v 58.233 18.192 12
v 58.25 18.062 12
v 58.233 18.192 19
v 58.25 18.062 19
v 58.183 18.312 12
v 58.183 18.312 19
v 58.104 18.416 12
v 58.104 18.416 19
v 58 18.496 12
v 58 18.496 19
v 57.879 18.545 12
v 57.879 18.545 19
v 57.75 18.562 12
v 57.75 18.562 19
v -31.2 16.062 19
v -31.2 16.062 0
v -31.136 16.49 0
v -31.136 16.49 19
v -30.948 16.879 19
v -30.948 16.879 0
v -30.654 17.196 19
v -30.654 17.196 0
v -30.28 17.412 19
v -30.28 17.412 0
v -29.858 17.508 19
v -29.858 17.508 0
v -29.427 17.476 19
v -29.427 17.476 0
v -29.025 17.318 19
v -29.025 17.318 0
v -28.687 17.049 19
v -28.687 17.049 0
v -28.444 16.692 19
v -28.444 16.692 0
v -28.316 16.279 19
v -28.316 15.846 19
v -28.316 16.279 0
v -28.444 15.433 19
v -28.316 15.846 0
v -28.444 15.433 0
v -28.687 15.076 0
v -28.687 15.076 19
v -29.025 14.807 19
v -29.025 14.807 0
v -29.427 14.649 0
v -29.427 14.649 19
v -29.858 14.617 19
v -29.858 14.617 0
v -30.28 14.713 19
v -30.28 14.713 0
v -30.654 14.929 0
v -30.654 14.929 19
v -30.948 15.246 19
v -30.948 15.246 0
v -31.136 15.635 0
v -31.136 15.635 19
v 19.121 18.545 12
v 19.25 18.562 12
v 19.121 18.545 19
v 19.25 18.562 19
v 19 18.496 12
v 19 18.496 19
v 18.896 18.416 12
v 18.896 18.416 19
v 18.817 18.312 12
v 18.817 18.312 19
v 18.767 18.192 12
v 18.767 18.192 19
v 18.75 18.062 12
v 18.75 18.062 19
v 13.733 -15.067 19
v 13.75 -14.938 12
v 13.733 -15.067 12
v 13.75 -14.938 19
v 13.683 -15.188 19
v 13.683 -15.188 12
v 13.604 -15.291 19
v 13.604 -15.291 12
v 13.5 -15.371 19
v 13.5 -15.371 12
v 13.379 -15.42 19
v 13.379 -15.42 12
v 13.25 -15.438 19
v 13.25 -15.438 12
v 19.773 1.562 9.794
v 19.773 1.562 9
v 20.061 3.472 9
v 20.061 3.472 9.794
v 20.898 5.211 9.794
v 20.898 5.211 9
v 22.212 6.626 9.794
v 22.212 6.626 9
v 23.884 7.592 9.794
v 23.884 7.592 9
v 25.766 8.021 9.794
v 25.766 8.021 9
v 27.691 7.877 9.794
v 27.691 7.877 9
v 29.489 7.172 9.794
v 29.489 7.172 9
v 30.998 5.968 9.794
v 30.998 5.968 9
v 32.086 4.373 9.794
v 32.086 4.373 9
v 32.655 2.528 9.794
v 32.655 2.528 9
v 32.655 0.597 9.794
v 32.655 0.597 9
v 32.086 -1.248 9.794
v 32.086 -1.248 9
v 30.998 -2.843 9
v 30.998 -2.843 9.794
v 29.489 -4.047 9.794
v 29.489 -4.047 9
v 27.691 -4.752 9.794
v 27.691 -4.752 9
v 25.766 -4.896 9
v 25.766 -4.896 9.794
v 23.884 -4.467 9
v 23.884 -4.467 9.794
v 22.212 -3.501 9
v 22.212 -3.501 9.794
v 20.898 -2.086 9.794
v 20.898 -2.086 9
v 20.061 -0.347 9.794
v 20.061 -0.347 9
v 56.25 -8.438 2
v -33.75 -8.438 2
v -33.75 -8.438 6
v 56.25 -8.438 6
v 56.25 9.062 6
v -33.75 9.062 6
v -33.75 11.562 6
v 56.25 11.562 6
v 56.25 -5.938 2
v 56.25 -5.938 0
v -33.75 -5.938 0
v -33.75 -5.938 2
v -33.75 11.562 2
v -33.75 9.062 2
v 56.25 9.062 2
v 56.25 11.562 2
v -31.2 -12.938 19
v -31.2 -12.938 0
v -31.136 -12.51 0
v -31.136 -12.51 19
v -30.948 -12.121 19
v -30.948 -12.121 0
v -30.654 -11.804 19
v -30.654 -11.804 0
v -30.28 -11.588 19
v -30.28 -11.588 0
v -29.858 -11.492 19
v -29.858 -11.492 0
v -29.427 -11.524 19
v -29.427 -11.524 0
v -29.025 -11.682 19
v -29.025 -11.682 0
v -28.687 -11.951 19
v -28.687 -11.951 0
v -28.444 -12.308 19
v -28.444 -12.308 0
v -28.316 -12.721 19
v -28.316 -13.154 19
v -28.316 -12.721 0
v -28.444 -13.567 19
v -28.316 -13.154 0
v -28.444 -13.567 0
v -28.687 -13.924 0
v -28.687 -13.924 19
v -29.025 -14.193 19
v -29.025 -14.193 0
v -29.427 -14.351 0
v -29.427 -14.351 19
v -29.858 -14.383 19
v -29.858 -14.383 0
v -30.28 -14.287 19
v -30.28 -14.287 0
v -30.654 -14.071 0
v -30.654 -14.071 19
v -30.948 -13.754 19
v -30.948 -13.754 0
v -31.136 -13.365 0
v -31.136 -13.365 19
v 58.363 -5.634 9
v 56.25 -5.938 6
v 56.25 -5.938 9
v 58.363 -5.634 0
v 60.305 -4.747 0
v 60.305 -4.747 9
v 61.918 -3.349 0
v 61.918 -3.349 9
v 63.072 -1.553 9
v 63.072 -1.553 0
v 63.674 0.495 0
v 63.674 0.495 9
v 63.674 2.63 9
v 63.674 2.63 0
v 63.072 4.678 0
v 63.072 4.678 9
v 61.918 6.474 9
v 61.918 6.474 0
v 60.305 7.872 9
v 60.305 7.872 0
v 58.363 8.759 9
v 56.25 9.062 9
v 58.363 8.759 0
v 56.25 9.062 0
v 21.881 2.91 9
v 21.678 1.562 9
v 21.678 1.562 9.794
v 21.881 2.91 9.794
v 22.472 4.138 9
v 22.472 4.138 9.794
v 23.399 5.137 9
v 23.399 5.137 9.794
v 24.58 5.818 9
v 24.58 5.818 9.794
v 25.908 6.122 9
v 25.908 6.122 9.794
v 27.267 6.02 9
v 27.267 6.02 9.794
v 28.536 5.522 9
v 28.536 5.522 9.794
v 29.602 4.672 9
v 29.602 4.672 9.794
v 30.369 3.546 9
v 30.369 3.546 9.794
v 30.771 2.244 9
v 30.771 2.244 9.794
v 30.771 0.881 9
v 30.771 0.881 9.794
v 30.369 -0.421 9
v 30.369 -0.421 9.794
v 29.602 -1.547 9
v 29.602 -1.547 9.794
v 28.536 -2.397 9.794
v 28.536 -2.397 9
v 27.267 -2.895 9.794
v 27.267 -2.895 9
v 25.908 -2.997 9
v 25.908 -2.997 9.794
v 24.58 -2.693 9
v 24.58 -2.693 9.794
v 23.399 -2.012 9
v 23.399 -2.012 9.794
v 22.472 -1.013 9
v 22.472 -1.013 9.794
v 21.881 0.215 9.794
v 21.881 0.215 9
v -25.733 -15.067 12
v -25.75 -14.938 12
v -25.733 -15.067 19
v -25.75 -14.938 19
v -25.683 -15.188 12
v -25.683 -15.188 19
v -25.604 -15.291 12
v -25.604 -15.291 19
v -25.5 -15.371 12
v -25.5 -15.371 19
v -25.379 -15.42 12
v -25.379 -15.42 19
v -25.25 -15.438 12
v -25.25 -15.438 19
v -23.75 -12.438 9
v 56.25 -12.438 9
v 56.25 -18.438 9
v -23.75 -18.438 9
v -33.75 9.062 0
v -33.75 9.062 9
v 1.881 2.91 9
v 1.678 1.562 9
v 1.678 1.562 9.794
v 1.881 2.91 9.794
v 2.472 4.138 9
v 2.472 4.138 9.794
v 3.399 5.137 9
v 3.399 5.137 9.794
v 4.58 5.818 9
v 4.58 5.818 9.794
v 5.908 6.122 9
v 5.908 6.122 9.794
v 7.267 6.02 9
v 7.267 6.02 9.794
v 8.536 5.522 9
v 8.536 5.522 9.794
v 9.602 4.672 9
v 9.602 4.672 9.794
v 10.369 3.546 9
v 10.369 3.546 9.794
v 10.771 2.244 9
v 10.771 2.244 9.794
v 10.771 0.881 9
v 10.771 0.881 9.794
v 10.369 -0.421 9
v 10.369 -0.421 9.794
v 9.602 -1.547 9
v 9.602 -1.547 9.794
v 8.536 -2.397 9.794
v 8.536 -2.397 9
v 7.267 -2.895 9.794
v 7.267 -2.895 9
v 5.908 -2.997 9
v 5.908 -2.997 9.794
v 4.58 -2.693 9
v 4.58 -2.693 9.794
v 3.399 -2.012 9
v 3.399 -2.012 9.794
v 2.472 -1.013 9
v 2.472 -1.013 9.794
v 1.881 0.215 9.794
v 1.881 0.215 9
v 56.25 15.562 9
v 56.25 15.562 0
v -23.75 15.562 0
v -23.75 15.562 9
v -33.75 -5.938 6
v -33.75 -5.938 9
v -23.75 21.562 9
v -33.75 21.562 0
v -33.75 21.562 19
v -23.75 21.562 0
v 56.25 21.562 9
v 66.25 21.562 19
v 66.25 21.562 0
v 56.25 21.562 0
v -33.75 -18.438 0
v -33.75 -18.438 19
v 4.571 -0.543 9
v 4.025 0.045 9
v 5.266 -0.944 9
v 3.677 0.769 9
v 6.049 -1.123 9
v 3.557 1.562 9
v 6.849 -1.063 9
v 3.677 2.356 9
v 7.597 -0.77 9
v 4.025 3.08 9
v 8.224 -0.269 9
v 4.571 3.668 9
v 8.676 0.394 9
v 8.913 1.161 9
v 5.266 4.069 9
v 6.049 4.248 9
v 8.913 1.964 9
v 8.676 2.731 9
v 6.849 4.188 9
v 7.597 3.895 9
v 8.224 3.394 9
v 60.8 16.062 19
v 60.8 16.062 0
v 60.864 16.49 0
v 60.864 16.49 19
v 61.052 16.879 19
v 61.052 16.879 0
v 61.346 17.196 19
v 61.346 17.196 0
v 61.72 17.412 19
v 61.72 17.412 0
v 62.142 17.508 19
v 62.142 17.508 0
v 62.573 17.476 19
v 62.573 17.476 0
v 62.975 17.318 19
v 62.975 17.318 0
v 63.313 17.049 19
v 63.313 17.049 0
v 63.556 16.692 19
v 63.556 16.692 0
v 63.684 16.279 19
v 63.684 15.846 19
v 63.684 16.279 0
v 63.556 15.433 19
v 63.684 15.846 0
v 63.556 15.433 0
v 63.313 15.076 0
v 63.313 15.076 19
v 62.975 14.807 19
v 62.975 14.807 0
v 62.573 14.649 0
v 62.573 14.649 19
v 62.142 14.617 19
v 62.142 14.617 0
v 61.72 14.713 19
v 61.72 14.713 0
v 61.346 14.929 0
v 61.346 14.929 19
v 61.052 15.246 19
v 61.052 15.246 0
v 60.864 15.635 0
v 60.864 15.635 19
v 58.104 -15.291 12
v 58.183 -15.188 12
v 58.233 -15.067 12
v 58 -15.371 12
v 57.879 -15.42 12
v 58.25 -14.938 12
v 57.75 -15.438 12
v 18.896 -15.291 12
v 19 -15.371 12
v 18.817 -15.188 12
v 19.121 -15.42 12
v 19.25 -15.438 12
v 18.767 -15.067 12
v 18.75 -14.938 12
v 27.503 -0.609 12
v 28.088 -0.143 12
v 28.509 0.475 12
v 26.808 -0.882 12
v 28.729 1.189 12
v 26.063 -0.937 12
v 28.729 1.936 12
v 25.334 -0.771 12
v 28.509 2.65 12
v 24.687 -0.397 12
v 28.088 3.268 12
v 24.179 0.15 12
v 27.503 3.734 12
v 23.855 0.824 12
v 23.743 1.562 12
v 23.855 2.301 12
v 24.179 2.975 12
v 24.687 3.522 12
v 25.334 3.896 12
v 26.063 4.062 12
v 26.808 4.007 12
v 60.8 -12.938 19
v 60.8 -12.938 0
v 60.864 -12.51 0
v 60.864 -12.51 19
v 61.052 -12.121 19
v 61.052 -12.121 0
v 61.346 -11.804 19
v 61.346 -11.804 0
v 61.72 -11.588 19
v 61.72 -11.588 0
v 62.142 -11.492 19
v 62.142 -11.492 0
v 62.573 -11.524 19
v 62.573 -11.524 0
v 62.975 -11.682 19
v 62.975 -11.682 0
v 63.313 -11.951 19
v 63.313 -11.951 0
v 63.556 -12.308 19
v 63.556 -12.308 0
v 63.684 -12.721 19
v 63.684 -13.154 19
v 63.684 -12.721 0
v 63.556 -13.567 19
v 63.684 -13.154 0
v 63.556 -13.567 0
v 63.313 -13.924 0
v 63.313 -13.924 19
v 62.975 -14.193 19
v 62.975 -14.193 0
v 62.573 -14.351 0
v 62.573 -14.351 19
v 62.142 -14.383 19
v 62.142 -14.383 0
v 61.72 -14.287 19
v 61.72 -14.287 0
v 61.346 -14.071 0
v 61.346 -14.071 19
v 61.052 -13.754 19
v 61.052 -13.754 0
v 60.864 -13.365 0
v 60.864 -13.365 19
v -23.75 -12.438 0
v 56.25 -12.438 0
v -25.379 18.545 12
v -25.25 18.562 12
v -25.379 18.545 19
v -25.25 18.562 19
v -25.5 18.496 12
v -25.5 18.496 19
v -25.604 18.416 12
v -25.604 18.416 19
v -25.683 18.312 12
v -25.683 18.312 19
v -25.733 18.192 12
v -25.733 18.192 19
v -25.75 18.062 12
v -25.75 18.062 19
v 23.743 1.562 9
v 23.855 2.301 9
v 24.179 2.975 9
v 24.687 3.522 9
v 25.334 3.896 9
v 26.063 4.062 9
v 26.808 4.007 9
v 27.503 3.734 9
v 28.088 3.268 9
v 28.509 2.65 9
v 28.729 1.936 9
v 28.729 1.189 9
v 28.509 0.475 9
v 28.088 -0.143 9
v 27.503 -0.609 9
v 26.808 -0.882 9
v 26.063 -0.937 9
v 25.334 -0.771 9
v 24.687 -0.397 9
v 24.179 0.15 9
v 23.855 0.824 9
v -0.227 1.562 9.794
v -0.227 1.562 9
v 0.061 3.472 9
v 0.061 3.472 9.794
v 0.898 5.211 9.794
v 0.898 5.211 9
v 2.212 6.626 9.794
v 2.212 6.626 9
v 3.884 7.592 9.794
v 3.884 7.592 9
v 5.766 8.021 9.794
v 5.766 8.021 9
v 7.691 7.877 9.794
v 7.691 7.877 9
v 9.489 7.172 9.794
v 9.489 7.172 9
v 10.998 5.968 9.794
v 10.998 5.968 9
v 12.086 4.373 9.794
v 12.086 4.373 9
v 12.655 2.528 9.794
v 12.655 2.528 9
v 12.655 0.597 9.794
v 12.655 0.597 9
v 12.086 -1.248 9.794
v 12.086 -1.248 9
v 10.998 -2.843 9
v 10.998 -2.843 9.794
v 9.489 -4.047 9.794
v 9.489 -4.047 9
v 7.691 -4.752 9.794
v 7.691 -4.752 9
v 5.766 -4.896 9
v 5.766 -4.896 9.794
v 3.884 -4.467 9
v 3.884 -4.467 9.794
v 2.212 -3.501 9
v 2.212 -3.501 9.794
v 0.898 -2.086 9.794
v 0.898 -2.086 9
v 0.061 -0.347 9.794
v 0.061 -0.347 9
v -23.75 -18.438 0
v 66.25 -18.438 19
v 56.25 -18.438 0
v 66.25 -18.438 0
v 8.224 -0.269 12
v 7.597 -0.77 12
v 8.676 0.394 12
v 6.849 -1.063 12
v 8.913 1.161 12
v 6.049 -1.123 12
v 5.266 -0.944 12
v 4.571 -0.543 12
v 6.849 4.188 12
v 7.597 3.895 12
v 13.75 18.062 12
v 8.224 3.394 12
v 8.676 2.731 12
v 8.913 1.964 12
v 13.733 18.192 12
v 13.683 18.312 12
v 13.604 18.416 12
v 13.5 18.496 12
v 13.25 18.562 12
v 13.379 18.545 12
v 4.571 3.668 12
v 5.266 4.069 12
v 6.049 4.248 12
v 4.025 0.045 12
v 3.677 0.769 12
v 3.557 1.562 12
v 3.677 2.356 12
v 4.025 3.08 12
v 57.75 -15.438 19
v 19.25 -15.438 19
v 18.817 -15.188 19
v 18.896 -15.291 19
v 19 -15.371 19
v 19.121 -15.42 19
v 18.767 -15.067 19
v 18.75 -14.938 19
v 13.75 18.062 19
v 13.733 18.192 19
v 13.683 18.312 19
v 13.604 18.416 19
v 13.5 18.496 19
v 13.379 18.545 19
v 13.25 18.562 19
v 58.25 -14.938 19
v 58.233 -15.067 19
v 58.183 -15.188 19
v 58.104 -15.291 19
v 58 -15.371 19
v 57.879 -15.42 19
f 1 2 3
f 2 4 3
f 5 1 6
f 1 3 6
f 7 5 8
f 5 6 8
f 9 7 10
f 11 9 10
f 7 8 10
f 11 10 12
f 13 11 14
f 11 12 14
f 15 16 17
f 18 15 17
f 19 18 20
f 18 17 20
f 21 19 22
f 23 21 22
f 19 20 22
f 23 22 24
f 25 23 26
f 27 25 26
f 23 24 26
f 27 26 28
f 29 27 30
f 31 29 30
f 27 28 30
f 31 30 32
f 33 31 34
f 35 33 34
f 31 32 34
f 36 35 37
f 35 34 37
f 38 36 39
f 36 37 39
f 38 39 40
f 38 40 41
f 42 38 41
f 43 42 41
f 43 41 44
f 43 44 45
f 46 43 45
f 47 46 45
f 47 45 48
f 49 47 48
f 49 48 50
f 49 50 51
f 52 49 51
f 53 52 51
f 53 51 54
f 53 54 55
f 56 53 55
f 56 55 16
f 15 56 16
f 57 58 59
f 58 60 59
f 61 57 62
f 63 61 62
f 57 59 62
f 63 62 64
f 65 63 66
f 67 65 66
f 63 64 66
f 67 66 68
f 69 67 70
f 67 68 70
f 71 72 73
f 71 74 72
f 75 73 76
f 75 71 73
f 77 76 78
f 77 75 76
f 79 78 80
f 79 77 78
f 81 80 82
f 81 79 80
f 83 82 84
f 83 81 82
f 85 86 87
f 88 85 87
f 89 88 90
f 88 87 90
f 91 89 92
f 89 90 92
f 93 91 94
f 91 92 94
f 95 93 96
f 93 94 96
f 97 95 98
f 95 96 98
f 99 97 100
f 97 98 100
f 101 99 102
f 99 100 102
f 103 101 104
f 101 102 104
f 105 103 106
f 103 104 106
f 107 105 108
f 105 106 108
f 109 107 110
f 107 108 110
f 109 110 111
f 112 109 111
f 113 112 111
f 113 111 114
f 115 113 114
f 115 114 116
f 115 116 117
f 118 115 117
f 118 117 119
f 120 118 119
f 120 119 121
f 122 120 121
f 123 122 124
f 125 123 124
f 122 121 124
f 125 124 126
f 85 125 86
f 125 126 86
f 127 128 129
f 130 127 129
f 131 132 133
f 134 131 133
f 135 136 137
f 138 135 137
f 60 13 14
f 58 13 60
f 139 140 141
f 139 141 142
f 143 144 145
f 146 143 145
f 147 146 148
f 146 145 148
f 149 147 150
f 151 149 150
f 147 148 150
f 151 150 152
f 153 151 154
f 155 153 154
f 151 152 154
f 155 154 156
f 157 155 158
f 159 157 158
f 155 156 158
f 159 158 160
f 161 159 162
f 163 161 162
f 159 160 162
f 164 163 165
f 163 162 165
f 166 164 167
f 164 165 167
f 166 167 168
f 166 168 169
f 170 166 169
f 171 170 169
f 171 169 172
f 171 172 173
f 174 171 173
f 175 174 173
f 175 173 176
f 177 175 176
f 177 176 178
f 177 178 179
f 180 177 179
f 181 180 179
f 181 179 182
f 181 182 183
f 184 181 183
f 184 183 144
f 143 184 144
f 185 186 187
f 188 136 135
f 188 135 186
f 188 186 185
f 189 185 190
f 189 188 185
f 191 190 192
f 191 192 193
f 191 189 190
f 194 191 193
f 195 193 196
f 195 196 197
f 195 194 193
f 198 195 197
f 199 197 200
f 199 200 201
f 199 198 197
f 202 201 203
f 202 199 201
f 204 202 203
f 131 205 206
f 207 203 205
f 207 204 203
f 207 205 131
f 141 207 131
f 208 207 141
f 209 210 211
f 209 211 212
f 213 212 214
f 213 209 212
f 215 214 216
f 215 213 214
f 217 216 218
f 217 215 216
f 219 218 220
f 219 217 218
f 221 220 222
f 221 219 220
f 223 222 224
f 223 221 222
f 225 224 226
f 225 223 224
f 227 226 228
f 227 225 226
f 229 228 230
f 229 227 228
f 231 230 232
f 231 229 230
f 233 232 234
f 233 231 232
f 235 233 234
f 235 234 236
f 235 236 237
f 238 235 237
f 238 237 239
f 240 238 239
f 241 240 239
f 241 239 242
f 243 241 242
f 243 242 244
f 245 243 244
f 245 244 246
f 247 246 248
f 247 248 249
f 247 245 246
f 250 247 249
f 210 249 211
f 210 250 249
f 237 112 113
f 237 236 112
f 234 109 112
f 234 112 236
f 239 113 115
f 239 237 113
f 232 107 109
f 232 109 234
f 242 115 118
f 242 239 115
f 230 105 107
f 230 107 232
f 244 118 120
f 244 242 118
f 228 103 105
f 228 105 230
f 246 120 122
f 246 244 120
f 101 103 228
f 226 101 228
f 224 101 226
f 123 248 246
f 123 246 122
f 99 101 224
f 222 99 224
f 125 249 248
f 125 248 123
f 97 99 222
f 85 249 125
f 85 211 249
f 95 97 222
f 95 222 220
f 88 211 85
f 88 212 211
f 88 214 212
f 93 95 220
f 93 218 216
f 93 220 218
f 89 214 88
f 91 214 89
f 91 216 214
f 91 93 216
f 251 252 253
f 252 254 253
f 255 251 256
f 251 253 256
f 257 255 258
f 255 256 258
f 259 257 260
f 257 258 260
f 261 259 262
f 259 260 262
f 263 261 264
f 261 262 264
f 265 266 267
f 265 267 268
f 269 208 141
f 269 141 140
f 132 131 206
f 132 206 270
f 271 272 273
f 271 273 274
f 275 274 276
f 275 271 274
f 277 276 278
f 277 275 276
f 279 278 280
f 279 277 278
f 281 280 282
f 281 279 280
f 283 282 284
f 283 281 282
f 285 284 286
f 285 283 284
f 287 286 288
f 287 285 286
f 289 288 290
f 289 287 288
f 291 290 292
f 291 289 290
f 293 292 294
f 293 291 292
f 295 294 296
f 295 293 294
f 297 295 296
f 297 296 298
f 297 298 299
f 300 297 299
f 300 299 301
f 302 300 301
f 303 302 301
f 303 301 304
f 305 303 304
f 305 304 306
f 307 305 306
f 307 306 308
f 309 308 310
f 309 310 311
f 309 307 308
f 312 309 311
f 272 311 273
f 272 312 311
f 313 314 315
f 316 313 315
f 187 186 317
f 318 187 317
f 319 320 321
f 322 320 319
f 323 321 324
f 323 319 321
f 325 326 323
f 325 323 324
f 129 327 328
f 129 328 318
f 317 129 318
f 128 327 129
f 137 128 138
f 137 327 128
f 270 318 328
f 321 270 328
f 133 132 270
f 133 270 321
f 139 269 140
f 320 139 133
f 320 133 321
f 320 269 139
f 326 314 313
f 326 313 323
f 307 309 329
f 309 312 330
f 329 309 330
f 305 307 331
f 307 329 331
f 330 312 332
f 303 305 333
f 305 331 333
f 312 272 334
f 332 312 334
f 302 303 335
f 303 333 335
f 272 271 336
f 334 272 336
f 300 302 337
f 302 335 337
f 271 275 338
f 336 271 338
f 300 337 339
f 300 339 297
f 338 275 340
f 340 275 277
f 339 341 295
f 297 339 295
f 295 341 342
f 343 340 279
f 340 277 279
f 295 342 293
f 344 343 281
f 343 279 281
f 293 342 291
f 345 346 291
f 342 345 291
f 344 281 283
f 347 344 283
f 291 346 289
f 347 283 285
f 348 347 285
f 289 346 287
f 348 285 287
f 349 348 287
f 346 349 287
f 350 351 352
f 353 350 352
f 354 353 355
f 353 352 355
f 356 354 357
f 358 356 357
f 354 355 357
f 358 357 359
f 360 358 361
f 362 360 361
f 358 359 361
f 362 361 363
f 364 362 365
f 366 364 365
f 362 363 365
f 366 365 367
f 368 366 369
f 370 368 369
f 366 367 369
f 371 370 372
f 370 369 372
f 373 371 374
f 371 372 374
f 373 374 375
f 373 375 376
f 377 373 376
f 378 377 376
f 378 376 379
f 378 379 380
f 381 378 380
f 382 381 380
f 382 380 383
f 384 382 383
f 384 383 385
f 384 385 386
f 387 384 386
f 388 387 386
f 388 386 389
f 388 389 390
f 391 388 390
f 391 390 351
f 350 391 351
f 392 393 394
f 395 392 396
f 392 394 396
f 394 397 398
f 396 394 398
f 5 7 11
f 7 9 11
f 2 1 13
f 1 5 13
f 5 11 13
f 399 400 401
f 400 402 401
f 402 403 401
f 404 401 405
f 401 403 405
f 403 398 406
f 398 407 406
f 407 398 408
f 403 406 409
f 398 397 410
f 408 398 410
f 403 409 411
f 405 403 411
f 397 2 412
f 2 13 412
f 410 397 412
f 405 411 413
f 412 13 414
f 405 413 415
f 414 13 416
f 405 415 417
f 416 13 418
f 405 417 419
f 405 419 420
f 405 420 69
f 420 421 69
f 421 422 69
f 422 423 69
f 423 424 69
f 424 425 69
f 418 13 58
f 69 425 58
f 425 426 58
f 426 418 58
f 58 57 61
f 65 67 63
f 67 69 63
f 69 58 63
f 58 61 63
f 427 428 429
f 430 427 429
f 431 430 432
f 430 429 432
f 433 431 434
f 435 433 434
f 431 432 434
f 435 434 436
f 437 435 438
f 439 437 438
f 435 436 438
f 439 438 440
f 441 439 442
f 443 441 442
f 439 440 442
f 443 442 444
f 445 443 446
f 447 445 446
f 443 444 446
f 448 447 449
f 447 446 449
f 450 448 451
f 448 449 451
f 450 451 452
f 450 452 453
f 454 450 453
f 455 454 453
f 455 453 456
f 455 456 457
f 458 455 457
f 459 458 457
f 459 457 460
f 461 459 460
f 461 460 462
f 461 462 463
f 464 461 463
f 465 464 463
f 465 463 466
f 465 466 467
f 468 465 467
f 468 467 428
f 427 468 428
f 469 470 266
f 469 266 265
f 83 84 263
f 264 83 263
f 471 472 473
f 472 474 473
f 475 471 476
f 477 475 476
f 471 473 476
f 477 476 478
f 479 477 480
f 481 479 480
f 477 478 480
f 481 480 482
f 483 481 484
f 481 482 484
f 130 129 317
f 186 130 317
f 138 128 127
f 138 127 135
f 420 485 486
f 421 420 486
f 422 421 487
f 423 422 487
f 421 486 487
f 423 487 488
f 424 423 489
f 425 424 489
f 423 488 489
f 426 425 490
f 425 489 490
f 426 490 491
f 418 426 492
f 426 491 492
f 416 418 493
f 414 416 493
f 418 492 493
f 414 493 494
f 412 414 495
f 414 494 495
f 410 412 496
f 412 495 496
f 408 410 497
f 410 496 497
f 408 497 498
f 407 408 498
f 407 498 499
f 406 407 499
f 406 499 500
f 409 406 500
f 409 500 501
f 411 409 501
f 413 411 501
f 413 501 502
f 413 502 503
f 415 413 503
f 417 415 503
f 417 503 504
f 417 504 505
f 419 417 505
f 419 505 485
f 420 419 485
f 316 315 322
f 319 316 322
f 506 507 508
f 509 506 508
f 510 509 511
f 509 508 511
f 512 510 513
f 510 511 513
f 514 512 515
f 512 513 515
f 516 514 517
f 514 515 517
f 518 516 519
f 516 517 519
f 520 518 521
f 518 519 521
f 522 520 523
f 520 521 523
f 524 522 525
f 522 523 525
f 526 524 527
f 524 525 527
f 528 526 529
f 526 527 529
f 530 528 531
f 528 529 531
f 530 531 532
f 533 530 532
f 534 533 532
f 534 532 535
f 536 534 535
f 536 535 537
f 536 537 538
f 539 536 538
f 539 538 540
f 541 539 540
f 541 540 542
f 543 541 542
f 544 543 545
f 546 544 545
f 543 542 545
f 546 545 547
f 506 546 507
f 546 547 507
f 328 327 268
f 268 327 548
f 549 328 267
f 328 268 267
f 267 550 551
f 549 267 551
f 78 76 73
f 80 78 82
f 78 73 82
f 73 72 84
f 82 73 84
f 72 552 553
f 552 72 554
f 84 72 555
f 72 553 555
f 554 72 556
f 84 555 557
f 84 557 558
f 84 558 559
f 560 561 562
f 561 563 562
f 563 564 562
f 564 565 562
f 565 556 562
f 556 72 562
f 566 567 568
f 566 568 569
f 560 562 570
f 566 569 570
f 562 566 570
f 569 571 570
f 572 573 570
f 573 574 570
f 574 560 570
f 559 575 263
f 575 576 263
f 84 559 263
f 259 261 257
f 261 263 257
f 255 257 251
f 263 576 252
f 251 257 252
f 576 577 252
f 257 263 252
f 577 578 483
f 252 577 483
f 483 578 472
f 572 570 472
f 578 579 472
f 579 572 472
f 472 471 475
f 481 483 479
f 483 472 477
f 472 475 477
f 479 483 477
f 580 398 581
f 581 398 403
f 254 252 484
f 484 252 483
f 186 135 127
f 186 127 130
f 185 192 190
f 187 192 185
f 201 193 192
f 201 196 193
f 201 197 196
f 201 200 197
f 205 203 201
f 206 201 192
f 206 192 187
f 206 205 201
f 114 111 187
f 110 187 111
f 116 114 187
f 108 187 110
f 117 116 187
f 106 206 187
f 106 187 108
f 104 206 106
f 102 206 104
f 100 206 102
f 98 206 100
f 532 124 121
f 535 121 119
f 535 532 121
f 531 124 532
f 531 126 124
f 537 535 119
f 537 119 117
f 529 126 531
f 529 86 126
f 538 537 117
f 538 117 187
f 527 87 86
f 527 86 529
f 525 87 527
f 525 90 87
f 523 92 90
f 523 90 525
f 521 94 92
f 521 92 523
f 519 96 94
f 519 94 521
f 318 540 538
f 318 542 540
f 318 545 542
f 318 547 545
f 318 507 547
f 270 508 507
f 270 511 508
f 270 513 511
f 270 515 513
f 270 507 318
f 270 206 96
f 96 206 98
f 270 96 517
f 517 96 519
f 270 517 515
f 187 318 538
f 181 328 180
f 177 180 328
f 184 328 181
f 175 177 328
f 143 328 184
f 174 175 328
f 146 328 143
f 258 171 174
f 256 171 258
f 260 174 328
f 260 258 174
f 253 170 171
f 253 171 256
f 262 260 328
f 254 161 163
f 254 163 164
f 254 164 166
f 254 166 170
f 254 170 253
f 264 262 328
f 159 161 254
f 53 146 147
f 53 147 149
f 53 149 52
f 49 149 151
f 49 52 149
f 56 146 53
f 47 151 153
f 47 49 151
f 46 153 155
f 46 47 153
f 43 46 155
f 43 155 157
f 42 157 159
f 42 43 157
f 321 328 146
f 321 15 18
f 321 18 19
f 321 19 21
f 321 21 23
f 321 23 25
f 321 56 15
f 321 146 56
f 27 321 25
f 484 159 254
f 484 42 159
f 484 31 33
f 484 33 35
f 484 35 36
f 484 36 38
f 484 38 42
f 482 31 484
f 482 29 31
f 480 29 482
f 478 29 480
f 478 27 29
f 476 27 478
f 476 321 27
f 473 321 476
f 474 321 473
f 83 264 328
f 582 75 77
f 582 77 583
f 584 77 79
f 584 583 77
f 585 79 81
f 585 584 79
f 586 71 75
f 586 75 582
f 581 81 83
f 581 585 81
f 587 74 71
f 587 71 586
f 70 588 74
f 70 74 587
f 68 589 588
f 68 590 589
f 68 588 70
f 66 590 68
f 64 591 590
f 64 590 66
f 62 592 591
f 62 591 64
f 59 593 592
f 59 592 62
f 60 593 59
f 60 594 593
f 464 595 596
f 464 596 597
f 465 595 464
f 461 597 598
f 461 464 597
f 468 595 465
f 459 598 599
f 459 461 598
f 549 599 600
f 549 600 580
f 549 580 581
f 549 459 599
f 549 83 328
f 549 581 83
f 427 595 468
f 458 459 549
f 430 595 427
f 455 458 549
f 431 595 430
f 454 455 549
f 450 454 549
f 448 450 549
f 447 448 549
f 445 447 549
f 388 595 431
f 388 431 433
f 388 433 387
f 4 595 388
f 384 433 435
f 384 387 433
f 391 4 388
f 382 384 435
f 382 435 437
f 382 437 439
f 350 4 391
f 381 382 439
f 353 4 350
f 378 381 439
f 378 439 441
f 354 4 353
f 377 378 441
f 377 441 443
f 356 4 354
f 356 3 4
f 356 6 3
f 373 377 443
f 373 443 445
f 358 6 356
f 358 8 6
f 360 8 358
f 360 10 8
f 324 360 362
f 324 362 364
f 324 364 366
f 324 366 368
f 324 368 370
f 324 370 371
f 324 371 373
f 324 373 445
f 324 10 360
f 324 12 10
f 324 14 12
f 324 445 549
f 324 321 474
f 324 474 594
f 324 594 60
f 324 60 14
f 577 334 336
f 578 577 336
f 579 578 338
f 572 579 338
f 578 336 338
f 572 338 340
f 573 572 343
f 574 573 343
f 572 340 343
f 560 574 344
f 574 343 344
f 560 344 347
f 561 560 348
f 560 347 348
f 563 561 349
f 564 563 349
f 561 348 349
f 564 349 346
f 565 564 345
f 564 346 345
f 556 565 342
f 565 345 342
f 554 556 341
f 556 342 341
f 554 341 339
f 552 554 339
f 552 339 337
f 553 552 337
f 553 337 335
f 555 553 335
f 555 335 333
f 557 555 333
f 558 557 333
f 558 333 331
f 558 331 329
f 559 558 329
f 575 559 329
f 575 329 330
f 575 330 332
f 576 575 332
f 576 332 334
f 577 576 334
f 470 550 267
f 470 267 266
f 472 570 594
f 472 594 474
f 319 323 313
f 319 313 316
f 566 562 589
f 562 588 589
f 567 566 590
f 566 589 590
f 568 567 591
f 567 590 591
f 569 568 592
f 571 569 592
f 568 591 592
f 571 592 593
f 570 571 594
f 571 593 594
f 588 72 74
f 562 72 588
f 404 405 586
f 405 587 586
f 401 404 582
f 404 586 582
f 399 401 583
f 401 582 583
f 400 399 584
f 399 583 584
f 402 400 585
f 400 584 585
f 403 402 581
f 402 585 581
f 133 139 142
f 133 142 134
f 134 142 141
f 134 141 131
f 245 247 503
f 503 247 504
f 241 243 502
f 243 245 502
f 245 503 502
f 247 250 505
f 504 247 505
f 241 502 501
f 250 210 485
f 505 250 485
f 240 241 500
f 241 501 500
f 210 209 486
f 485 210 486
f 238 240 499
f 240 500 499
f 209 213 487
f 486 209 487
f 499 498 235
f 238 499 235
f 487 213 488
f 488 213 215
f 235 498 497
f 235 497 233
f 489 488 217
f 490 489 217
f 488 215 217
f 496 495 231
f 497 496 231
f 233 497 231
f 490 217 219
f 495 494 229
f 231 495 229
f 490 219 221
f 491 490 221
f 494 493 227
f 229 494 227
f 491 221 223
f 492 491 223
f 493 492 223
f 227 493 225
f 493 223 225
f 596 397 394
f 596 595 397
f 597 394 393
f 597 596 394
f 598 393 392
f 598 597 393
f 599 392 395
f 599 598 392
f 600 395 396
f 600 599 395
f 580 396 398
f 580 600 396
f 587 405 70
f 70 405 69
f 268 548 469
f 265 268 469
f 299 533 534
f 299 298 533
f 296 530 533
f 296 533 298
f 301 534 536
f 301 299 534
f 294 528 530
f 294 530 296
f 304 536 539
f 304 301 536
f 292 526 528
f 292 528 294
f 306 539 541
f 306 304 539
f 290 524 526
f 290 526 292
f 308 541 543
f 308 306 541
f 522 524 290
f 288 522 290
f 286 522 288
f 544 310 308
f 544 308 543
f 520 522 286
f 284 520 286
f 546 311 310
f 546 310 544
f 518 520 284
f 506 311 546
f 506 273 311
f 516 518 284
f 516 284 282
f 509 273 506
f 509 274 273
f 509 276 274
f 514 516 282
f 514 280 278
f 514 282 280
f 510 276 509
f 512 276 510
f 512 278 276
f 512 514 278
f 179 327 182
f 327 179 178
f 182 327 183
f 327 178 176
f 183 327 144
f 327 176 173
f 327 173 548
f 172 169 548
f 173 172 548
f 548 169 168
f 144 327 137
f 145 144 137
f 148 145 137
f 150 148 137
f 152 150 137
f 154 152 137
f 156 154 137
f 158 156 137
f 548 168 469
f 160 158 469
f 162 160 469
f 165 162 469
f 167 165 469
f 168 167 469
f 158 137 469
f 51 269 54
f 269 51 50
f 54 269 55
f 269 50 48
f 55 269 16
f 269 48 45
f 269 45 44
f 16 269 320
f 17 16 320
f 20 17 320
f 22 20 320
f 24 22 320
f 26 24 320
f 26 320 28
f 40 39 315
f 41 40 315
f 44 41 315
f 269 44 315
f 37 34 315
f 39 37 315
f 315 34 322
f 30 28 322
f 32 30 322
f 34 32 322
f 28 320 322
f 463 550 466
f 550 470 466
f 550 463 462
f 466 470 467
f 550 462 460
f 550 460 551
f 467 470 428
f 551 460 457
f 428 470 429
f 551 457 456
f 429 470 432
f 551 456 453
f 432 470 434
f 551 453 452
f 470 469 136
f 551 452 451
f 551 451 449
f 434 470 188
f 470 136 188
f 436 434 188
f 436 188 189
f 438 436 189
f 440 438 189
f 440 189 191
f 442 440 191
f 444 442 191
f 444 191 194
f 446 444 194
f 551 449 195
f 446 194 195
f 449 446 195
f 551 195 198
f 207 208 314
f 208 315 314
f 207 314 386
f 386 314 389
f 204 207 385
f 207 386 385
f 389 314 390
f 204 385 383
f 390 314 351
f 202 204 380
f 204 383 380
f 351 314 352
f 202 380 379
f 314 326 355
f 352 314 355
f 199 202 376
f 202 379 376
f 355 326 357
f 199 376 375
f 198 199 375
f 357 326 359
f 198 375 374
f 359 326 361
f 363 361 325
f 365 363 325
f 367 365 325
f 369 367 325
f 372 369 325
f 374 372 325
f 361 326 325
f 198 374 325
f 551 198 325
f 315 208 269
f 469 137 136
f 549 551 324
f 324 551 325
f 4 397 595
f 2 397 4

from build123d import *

# Parameters (mm, degrees)
SKETCH1_W           = 100
SKETCH1_H           = 40
BOSS_EXTRUDE1_DEPTH = 38
CUT_EXTRUDE2_START  = -12
SKETCH2_W           = 39.5
SKETCH2_H           = 34
CUT_EXTRUDE2_DEPTH  = 21
CUT_EXTRUDE4_REACH  = 81.36
SKETCH4_R           = 1.45
SKETCH6_W           = 100
SKETCH6_H           = 19
CUT_EXTRUDE5_DEPTH  = 87.215210375
FILLET1_R           = 0.5
CUT_EXTRUDE12_DEPTH = 9
CUT_EXTRUDE13_REACH = 72.385
SKETCH18_R          = 2.506862912
SKETCH18_R_2        = 2.693115416
SKETCH19_R          = 6.477
SKETCH19_R_2        = 4.572
CUT_EXTRUDE14_DEPTH = 0.79375
SKETCH21_W          = 10
SKETCH21_H          = 15
CUT_EXTRUDE15_DEPTH = 9
SKETCH22_W          = 4
SKETCH22_H          = 2.5
CUT_EXTRUDE16_DEPTH = 90
SKETCH23_W          = 80
SKETCH23_H          = 6
CUT_EXTRUDE17_DEPTH = 9


with BuildPart() as part:
    # Sketch1 → Boss-Extrude1 (new body)
    with BuildSketch(Plane.XY):
        with Locations((16.25, 1.5625)):
            Rectangle(SKETCH1_W, SKETCH1_H)
    extrude(amount=BOSS_EXTRUDE1_DEPTH)

    # Sketch2 → Cut-Extrude2 (cut)
    with BuildSketch(Plane(origin=(0, 0, 0), x_dir=(-1, 0, 0), z_dir=(0, 0, -1)).offset(CUT_EXTRUDE2_START)):
        with Locations((-38.5, 1.5625)):
            Rectangle(SKETCH2_W, SKETCH2_H)
        with Locations((6, 1.5625)):
            Rectangle(SKETCH2_W, SKETCH2_H)
    extrude(amount=-CUT_EXTRUDE2_DEPTH, mode=Mode.SUBTRACT)

    # Sketch4 → Cut-Extrude4 (cut, up to next)
    with BuildSketch(Plane(origin=(0, 0, 0), x_dir=(-1, 0, 0), z_dir=(0, 0, -1)), mode=Mode.PRIVATE) as cut_extrude4_sk1:
        with Locations((-62.25, 16.0625)):
            Circle(SKETCH4_R)
    cut_extrude4_tool1 = extrude(cut_extrude4_sk1.sketch, amount=-CUT_EXTRUDE4_REACH, mode=Mode.PRIVATE) & part.part
    # Sketch4 → Cut-Extrude4 (cut, up to next)
    with BuildSketch(Plane(origin=(0, 0, 0), x_dir=(-1, 0, 0), z_dir=(0, 0, -1)), mode=Mode.PRIVATE) as cut_extrude4_sk2:
        with Locations((-62.25, -12.9375)):
            Circle(SKETCH4_R)
    cut_extrude4_tool2 = extrude(cut_extrude4_sk2.sketch, amount=-CUT_EXTRUDE4_REACH, mode=Mode.PRIVATE) & part.part
    # Sketch4 → Cut-Extrude4 (cut, up to next)
    with BuildSketch(Plane(origin=(0, 0, 0), x_dir=(-1, 0, 0), z_dir=(0, 0, -1)), mode=Mode.PRIVATE) as cut_extrude4_sk3:
        with Locations((29.75, 16.0625)):
            Circle(SKETCH4_R)
    cut_extrude4_tool3 = extrude(cut_extrude4_sk3.sketch, amount=-CUT_EXTRUDE4_REACH, mode=Mode.PRIVATE) & part.part
    # Sketch4 → Cut-Extrude4 (cut, up to next)
    with BuildSketch(Plane(origin=(0, 0, 0), x_dir=(-1, 0, 0), z_dir=(0, 0, -1)), mode=Mode.PRIVATE) as cut_extrude4_sk4:
        with Locations((29.75, -12.9375)):
            Circle(SKETCH4_R)
    cut_extrude4_tool4 = extrude(cut_extrude4_sk4.sketch, amount=-CUT_EXTRUDE4_REACH, mode=Mode.PRIVATE) & part.part
    add(cut_extrude4_tool1.solids().sort_by_distance((62.25, 16.0625, 0))[0], mode=Mode.SUBTRACT)
    add(cut_extrude4_tool2.solids().sort_by_distance((62.25, -12.9375, 0))[0], mode=Mode.SUBTRACT)
    add(cut_extrude4_tool3.solids().sort_by_distance((-29.75, 16.0625, 0))[0], mode=Mode.SUBTRACT)
    add(cut_extrude4_tool4.solids().sort_by_distance((-29.75, -12.9375, 0))[0], mode=Mode.SUBTRACT)

    # Sketch6 → Cut-Extrude5 (cut, through all)
    with BuildSketch(Plane(origin=(0, 21.5625, 0), x_dir=(1, 0, 0), z_dir=(0, 1, 0))):
        with Locations((16.25, -28.5)):
            Rectangle(SKETCH6_W, SKETCH6_H)
    extrude(amount=-CUT_EXTRUDE5_DEPTH, mode=Mode.SUBTRACT)

    # Fillet1
    fillet1_edges = [part.edges().sort_by_distance(p)[0] for p in [
        (-25.75, -15.4375, 15.5),
        (13.75, -15.4375, 15.5),
        (-25.75, 18.5625, 15.5),
        (13.75, 18.5625, 15.5),
        (18.75, -15.4375, 15.5),
        (58.25, -15.4375, 15.5),
        (18.75, 18.5625, 15.5),
        (58.25, 18.5625, 15.5),
    ]]
    fillet(fillet1_edges, radius=FILLET1_R)

    # Sketch17 → Cut-Extrude12 (cut)
    with BuildSketch(Plane(origin=(0, 0, 0), x_dir=(-1, 0, 0), z_dir=(0, 0, -1))):
        with BuildLine():
            Line((-56.25, 9.0625), (23.75, 9.0625))
            ThreePointArc((23.75, 9.0625), (31.25, 1.5625), (23.75, -5.9375))
            Line((23.75, -5.9375), (-56.25, -5.9375))
            ThreePointArc((-56.25, -5.9375), (-63.75, 1.5625), (-56.25, 9.0625))
        make_face()
    extrude(amount=-CUT_EXTRUDE12_DEPTH, mode=Mode.SUBTRACT)

    # Sketch18 → Cut-Extrude13 (cut, up to next)
    with BuildSketch(Plane(origin=(0, 0, 9), x_dir=(-1, 0, 0), z_dir=(0, 0, -1)), mode=Mode.PRIVATE) as cut_extrude13_sk1:
        with Locations((-26.25, 1.5625)):
            Circle(SKETCH18_R)
    cut_extrude13_tool1 = extrude(cut_extrude13_sk1.sketch, amount=-CUT_EXTRUDE13_REACH, mode=Mode.PRIVATE) & part.part
    # Sketch18 → Cut-Extrude13 (cut, up to next)
    with BuildSketch(Plane(origin=(0, 0, 9), x_dir=(-1, 0, 0), z_dir=(0, 0, -1)), mode=Mode.PRIVATE) as cut_extrude13_sk2:
        with Locations((-6.25, 1.5625)):
            Circle(SKETCH18_R_2)
    cut_extrude13_tool2 = extrude(cut_extrude13_sk2.sketch, amount=-CUT_EXTRUDE13_REACH, mode=Mode.PRIVATE) & part.part
    add(cut_extrude13_tool1.solids().sort_by_distance((26.25, 1.5625, 9))[0], mode=Mode.SUBTRACT)
    add(cut_extrude13_tool2.solids().sort_by_distance((6.25, 1.5625, 9))[0], mode=Mode.SUBTRACT)

    # Sketch19 → Cut-Extrude14 (cut)
    # profile 1 of 2: a face of its own
    with BuildSketch(Plane(origin=(0, 0, 9), x_dir=(-1, 0, 0), z_dir=(0, 0, -1))):
        with Locations((-26.25, 1.5625)):
            Circle(SKETCH19_R)
        with Locations((-26.25, 1.5625)):
            Circle(SKETCH19_R_2, mode=Mode.SUBTRACT)
    # profile 2 of 2: a face of its own
    with BuildSketch(Plane(origin=(0, 0, 9), x_dir=(-1, 0, 0), z_dir=(0, 0, -1))):
        with Locations((-6.25, 1.5625)):
            Circle(SKETCH19_R)
        with Locations((-6.25, 1.5625)):
            Circle(SKETCH19_R_2, mode=Mode.SUBTRACT)
    extrude(amount=-CUT_EXTRUDE14_DEPTH, mode=Mode.SUBTRACT)

    # Sketch21 → Cut-Extrude15 (cut)
    with BuildSketch(Plane(origin=(0, 0, 0), x_dir=(-1, 0, 0), z_dir=(0, 0, -1))):
        with Locations((28.75, 1.5625)):
            Rectangle(SKETCH21_W, SKETCH21_H)
    extrude(amount=-CUT_EXTRUDE15_DEPTH, mode=Mode.SUBTRACT)

    # Sketch22 → Cut-Extrude16 (cut)
    with BuildSketch(Plane.ZY.offset(33.75)):
        with Locations((4, 10.3125)):
            Rectangle(SKETCH22_W, SKETCH22_H)
        with Locations((4, -7.1875)):
            Rectangle(SKETCH22_W, SKETCH22_H)
    extrude(amount=-CUT_EXTRUDE16_DEPTH, mode=Mode.SUBTRACT)

    # Sketch23 → Cut-Extrude17 (cut)
    with BuildSketch(Plane(origin=(0, 0, 0), x_dir=(-1, 0, 0), z_dir=(0, 0, -1))):
        with Locations((-16.25, 18.5625)):
            Rectangle(SKETCH23_W, SKETCH23_H)
        with Locations((-16.25, -15.4375)):
            Rectangle(SKETCH23_W, SKETCH23_H)
    extrude(amount=-CUT_EXTRUDE17_DEPTH, mode=Mode.SUBTRACT)


solid = part.part
